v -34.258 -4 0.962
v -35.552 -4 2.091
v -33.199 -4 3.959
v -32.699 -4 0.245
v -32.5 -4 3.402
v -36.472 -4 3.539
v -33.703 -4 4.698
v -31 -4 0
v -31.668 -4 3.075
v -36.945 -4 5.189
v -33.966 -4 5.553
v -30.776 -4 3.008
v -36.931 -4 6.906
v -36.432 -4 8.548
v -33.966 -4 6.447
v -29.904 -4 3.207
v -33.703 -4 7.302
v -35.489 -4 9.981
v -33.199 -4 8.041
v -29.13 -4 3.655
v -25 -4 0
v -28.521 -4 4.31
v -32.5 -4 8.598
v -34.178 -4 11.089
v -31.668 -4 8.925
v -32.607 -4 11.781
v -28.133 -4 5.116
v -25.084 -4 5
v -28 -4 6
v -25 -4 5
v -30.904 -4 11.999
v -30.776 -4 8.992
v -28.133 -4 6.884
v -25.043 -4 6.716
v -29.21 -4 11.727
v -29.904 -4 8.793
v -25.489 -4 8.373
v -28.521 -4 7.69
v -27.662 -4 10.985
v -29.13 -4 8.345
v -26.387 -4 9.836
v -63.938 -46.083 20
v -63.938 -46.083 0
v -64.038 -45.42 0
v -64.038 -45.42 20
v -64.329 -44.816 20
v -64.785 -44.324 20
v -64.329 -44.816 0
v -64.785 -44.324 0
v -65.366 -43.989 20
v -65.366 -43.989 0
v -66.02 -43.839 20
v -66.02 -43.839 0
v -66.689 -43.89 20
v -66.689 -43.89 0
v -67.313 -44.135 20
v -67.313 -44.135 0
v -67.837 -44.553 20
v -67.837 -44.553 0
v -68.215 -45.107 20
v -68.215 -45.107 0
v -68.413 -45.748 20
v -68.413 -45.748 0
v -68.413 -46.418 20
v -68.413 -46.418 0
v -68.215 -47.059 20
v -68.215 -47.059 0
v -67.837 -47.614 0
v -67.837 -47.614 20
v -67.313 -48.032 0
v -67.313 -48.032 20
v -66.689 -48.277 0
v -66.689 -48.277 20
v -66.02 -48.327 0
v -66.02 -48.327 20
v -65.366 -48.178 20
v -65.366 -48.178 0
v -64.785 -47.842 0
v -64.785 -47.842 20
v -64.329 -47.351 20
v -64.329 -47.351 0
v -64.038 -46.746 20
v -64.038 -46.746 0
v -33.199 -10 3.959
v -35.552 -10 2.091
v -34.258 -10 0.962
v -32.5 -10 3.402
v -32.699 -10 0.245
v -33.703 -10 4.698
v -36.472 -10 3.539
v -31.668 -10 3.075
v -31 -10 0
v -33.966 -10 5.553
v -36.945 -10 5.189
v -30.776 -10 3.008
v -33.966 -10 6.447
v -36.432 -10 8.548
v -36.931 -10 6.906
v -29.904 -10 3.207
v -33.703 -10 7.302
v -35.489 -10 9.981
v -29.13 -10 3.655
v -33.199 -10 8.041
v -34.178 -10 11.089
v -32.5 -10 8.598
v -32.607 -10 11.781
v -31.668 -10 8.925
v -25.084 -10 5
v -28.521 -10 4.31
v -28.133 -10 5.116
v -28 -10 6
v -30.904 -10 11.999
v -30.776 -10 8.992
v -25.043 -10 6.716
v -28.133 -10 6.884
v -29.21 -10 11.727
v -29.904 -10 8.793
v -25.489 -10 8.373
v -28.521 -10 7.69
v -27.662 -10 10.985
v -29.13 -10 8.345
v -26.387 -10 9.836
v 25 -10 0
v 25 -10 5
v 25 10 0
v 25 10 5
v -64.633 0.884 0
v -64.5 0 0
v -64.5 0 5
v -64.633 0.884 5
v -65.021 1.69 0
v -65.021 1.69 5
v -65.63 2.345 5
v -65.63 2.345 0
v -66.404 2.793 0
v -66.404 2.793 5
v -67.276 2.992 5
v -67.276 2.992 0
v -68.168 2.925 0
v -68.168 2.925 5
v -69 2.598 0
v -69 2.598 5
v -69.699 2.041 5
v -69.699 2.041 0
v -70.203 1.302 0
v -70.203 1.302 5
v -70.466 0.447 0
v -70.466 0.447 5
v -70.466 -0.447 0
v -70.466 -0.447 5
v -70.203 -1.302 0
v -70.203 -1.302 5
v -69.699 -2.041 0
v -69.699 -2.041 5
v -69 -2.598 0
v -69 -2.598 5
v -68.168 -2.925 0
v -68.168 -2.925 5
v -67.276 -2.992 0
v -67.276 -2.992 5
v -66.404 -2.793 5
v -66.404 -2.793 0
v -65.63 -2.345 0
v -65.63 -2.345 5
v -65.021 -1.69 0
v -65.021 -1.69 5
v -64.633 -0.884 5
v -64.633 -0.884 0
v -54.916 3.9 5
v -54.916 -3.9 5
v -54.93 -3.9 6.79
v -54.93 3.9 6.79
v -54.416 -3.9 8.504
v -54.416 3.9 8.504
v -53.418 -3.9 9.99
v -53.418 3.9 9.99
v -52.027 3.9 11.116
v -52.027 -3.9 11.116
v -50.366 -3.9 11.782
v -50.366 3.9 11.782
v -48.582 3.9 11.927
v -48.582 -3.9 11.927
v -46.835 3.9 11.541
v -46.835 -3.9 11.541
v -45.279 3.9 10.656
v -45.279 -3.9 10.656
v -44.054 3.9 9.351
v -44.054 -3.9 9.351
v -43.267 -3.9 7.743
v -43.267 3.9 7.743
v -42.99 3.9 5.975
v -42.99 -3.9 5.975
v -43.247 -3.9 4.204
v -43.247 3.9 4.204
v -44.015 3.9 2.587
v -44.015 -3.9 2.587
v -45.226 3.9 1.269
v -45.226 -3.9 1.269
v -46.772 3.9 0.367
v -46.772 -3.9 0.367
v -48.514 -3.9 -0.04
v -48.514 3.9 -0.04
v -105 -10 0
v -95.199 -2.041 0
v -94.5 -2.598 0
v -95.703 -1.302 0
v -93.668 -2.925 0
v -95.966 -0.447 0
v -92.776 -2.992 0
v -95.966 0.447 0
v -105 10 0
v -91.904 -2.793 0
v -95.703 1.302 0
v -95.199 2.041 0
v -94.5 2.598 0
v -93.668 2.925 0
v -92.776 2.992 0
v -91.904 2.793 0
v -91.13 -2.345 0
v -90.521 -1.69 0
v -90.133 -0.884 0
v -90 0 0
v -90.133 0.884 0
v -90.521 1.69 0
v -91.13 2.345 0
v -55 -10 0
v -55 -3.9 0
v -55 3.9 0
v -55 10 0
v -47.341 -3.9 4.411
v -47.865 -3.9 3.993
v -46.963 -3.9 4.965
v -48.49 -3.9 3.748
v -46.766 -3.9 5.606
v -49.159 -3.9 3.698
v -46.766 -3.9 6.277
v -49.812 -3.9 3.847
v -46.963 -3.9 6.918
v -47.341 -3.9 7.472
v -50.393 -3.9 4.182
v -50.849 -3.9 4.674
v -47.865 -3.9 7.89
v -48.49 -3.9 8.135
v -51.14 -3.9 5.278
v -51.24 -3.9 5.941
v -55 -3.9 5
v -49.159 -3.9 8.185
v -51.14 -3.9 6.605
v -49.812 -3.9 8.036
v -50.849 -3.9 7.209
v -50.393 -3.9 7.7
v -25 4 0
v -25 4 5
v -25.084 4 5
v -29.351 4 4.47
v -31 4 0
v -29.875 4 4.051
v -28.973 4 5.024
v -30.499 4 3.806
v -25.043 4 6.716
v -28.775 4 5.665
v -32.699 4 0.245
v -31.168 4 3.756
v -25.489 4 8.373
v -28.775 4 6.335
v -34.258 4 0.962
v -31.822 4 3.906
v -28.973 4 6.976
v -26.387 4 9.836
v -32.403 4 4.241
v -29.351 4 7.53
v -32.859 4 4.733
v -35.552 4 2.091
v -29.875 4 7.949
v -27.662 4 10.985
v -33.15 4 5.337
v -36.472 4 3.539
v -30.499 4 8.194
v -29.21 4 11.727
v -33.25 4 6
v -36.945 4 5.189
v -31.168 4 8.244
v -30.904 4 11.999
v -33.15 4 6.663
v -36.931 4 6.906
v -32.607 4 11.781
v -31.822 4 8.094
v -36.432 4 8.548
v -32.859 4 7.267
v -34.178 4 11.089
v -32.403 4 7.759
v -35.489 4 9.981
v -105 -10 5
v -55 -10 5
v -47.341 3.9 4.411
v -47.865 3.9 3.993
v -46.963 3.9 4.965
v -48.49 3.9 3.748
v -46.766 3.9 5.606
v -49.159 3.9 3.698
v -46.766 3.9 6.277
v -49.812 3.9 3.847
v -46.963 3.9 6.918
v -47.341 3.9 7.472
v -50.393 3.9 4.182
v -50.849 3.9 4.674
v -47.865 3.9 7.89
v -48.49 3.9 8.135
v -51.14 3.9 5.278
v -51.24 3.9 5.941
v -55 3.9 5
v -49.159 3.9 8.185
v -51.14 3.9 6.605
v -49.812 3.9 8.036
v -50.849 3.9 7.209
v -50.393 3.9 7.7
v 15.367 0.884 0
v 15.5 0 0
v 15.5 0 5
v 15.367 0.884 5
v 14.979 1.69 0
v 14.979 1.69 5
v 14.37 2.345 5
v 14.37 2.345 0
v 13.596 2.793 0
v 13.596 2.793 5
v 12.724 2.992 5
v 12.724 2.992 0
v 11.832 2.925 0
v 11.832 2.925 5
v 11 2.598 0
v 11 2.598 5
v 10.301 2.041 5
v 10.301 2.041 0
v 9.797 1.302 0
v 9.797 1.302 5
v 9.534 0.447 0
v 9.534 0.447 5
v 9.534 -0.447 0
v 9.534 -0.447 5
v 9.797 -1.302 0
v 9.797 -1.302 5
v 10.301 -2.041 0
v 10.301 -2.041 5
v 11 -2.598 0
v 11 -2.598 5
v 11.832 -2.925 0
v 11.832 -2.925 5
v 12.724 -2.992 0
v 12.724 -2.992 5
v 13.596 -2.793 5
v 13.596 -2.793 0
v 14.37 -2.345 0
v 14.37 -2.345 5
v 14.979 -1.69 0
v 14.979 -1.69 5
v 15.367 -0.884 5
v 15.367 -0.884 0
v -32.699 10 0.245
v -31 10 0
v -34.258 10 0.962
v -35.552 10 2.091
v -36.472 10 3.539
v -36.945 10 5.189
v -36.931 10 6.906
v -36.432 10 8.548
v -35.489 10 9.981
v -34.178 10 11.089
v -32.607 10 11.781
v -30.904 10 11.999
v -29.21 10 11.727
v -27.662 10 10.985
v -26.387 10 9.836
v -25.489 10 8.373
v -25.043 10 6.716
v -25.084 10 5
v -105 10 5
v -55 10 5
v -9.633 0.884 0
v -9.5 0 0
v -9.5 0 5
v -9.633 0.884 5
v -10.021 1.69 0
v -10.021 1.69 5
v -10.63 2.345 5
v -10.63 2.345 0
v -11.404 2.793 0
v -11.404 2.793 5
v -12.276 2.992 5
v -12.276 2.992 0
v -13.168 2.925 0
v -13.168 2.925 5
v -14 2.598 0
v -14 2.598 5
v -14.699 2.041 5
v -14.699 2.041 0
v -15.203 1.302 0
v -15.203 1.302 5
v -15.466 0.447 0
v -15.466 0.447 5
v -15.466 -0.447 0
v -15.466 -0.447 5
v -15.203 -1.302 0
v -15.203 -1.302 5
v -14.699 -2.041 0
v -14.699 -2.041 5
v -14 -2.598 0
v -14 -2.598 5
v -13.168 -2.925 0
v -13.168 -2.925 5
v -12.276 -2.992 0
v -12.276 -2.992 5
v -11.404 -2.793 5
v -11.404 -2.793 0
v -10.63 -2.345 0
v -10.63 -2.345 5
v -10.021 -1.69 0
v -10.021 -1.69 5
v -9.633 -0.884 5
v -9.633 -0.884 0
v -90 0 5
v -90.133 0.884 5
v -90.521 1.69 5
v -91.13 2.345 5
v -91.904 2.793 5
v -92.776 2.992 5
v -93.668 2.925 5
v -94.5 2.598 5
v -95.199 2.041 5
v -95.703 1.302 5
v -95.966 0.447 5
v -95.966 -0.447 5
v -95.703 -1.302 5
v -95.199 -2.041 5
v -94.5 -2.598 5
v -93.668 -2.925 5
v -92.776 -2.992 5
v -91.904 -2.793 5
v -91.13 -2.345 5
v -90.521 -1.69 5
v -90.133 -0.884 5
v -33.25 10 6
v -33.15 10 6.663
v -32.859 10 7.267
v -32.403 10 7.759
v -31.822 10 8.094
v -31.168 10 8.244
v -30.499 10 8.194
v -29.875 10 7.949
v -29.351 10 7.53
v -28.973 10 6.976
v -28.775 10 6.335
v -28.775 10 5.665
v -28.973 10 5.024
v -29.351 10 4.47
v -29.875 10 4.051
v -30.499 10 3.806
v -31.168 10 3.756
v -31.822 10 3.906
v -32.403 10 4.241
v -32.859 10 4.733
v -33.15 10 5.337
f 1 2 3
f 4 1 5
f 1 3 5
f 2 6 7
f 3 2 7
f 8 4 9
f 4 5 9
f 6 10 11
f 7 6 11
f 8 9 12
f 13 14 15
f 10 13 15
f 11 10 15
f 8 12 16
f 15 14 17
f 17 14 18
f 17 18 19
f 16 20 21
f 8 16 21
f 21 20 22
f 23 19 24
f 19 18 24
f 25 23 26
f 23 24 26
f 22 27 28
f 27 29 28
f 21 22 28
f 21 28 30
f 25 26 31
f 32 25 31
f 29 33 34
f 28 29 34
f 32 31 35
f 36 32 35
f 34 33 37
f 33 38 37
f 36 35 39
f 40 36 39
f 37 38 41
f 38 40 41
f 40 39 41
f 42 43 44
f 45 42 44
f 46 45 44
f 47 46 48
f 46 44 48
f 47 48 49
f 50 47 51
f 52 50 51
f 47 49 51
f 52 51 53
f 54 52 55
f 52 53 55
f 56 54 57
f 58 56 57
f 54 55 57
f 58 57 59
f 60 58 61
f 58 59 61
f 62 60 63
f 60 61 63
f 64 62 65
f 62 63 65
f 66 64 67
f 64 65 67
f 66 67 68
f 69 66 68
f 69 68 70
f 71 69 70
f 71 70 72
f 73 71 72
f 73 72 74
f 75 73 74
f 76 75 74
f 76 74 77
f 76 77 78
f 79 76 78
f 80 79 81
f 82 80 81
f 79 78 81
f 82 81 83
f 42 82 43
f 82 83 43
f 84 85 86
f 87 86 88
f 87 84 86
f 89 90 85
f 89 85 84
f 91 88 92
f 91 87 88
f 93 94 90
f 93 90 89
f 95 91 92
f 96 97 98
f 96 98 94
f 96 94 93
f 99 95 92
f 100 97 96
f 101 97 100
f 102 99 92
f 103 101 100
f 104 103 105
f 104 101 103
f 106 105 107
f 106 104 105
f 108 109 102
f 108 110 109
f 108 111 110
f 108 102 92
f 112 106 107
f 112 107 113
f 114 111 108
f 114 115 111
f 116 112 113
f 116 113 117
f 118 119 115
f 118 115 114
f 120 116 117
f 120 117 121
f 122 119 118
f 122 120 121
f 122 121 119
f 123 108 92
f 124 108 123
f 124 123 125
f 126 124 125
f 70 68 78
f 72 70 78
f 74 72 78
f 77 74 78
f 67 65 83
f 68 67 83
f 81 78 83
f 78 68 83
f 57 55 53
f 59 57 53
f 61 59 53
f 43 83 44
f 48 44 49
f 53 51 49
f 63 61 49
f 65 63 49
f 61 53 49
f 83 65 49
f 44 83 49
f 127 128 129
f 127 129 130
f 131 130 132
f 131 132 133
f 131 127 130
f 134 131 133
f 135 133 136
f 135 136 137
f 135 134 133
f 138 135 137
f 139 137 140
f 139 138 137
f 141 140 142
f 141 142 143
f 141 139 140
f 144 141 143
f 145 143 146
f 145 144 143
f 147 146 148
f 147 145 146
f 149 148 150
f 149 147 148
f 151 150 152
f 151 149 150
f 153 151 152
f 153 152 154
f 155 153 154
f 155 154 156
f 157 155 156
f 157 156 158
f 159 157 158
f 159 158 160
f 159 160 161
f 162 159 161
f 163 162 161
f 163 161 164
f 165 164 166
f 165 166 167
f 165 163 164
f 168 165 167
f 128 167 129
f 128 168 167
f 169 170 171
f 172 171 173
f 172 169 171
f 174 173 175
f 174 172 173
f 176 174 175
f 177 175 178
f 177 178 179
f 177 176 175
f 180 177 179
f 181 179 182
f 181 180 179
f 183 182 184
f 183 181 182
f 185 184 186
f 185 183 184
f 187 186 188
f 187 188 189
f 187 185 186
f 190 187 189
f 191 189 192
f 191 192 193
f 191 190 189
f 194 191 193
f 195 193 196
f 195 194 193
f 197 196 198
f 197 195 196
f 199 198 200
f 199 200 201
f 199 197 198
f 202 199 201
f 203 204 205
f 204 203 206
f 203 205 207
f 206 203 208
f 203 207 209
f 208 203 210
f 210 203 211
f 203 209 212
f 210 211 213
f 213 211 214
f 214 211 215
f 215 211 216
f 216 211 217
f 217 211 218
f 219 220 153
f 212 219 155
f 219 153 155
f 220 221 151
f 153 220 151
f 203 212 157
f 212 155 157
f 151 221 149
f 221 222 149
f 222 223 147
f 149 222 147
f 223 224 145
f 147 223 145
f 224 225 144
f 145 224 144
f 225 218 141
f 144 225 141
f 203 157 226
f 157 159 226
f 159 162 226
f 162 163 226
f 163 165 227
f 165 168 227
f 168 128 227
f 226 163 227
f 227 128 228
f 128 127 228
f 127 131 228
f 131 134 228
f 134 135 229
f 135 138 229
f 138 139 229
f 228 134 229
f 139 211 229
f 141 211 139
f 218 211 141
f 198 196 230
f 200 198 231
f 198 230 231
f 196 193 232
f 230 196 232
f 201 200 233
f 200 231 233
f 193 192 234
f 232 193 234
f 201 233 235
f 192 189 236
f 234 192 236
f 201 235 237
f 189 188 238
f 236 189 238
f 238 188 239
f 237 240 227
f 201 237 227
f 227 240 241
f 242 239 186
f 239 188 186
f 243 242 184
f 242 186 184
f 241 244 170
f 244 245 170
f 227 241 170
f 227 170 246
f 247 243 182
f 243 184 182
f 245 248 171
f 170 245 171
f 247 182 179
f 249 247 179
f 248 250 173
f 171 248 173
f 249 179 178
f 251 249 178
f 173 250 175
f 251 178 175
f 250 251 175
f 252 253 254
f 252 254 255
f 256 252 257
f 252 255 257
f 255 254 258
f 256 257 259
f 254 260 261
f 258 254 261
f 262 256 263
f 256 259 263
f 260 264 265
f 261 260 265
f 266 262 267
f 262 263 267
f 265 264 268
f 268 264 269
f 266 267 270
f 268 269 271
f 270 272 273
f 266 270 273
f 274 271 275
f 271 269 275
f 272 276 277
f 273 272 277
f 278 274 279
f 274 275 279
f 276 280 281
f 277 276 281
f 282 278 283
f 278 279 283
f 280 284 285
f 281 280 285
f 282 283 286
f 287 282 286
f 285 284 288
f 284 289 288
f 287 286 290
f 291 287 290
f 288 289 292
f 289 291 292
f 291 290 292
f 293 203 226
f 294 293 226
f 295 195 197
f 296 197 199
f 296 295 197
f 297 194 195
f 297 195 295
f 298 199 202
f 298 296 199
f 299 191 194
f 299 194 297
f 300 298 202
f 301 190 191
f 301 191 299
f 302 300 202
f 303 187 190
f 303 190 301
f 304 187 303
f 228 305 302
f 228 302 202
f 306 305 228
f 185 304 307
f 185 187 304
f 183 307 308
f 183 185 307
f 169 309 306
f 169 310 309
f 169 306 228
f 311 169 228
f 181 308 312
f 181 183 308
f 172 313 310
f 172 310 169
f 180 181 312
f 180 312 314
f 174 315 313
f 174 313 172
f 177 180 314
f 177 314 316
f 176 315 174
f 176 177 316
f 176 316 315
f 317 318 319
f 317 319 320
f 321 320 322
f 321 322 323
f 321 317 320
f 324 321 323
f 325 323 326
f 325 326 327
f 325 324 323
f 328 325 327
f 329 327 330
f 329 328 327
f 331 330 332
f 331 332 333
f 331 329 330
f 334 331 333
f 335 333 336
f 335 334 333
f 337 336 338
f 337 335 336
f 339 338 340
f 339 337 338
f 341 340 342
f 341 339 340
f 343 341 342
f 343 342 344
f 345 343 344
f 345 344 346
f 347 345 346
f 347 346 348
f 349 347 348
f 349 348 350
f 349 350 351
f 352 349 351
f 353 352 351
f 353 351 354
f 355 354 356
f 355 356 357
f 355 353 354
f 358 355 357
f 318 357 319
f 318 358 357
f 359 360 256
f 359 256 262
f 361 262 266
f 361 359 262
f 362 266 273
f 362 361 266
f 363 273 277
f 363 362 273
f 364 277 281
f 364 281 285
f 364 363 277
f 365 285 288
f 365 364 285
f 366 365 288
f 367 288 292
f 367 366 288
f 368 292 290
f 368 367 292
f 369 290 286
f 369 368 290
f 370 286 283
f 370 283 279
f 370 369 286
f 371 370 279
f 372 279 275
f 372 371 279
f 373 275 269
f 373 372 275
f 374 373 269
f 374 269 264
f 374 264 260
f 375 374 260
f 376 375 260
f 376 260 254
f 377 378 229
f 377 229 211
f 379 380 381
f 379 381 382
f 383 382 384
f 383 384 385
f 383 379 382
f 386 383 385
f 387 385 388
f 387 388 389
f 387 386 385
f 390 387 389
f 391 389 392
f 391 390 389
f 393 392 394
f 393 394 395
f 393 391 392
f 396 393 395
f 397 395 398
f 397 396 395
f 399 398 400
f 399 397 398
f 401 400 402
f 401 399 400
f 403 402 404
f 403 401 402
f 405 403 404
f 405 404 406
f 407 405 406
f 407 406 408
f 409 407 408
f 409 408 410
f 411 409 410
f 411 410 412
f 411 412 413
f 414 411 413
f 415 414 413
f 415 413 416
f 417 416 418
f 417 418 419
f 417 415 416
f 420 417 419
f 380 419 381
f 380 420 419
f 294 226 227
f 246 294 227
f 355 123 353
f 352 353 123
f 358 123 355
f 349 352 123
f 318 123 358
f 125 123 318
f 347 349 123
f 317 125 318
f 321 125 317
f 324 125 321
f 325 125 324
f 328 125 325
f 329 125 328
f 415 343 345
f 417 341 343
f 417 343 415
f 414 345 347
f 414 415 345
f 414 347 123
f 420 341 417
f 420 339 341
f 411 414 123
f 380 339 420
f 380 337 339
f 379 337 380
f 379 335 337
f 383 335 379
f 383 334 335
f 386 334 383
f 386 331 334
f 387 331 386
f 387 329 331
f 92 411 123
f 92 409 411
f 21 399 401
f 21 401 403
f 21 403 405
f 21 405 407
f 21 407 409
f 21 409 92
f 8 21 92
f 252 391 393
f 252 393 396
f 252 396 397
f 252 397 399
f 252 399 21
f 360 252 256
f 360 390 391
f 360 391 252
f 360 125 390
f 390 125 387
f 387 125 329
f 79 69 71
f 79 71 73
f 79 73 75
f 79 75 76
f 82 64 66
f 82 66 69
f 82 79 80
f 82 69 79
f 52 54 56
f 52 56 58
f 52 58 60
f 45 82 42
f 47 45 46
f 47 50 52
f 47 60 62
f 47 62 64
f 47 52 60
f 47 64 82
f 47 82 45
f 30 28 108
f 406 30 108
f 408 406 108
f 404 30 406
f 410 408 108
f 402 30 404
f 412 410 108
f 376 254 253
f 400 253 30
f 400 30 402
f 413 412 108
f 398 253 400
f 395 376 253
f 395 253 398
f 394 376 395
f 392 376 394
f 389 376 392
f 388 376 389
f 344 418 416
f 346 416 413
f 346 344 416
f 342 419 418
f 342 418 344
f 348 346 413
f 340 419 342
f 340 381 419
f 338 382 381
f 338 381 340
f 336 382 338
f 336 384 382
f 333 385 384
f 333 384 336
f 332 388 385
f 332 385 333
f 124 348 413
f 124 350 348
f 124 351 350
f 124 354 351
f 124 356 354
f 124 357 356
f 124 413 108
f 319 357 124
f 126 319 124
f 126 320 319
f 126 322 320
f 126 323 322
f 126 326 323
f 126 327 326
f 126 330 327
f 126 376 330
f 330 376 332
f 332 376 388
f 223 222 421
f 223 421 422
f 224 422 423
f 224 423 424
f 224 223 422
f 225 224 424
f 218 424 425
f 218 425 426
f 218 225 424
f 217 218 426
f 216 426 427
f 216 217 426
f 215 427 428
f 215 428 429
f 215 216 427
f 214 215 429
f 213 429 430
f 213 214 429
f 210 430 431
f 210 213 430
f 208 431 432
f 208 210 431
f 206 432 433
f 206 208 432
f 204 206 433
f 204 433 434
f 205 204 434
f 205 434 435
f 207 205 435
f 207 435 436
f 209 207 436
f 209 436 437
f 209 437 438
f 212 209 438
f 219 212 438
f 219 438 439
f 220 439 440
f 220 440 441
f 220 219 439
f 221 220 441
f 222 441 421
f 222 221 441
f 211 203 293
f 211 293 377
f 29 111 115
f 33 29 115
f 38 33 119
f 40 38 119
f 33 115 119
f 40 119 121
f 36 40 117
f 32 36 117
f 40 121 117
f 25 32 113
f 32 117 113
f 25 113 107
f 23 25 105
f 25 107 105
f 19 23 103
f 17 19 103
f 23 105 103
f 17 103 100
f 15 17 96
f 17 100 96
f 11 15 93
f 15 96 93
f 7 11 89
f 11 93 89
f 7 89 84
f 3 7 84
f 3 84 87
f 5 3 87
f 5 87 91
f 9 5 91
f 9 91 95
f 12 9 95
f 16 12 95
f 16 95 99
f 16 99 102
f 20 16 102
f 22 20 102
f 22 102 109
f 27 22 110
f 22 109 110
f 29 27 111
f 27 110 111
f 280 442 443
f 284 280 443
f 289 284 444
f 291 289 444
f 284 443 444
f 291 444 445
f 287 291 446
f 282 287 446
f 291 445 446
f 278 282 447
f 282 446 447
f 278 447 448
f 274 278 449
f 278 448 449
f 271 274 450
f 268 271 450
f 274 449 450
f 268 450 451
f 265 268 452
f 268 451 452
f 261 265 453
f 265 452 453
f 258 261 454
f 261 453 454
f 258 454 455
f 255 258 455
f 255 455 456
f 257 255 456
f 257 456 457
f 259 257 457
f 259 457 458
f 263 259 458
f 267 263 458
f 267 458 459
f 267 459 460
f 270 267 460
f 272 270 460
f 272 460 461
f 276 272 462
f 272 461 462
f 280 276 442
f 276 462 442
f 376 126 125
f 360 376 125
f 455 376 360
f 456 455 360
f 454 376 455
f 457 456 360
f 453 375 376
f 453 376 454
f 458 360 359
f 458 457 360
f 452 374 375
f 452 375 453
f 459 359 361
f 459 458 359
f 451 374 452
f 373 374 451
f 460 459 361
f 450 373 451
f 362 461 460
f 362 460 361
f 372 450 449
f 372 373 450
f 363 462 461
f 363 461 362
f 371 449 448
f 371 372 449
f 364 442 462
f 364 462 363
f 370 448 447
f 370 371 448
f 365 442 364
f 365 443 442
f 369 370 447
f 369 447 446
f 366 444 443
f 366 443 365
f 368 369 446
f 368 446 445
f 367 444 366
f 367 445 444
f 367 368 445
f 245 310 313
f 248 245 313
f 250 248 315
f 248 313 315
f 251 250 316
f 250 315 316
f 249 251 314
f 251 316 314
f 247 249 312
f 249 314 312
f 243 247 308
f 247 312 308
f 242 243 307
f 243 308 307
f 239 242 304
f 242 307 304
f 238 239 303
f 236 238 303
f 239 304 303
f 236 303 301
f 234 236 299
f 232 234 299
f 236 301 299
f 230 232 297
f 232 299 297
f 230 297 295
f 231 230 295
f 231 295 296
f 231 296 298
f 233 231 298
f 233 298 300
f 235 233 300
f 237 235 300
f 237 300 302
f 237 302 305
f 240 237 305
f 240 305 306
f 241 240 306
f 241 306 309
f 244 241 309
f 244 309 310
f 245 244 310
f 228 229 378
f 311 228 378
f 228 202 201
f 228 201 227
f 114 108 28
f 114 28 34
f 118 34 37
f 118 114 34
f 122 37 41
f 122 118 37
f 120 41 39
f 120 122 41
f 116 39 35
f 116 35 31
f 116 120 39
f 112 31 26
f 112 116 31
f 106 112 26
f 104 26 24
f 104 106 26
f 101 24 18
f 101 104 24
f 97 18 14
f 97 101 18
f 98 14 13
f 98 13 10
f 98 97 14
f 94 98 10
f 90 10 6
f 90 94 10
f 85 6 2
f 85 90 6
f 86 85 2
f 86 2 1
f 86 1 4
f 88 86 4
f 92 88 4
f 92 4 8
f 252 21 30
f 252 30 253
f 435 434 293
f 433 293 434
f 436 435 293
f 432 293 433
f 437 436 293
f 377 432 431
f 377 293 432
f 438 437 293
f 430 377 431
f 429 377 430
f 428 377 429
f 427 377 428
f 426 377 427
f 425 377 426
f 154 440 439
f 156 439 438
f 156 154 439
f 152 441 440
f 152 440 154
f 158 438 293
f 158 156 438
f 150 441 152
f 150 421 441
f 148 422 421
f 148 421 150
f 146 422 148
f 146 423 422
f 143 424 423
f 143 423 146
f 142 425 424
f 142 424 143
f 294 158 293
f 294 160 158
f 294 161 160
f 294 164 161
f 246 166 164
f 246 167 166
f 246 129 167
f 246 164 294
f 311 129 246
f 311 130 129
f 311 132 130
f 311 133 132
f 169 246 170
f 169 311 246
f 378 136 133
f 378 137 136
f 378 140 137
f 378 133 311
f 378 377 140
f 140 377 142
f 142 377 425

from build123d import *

# Parameters (mm, degrees)
F0_W      = 50
F0_H      = 20
F0_R      = 3
F1_DEPTH  = 5
F2_R      = 3
F3_DEPTH  = 6
F4_R      = 3
F5_DEPTH  = 6
F6_R      = 2.25
F7_DEPTH  = 13.9
F8_DEPTH  = 6.1
F9_R      = 2.25
F10_DEPTH = 20
F4_R_2    = 2.25
F11_DEPTH = 6


with BuildPart() as f1:
    # F0 (on Top) → F1 (new body)
    with BuildSketch(Plane.XY):
        Rectangle(F0_W, F0_H)
        with Locations((-12.5, 0)):
            Circle(F0_R, mode=Mode.SUBTRACT)
        with Locations((12.5, 0)):
            Circle(F0_R, mode=Mode.SUBTRACT)
        with Locations((-80, 0)):
            Rectangle(F0_W, F0_H)
        with Locations((-93, 0)):
            Circle(F0_R, mode=Mode.SUBTRACT)
        with Locations((-67.5, 0)):
            Circle(F0_R, mode=Mode.SUBTRACT)
    extrude(amount=F1_DEPTH)

    # F2 (on face) → F3 (join)
    with BuildSketch(Plane.XZ.offset(10)):
        with BuildLine():
            Line((-25, 5), (-25.08392, 5))
            ThreePointArc((-25.08392, 5), (-34.872983, 10.582576), (-31, 0))
            Line((-31, 0), (-25, 0))
            Line((-25, 0), (-25, 5))
        make_face()
        with Locations((-31, 6)):
            Circle(F2_R, mode=Mode.SUBTRACT)
    extrude(amount=-F3_DEPTH)

    # F4 (on face) → F5 (join)
    with BuildSketch(Plane(origin=(0, 10, 0), x_dir=(-1, 0, 0), z_dir=(0, 1, 0))):
        with BuildLine():
            Line((25.08392, 5), (25, 5))
            Line((25, 5), (25, 0))
            Line((25, 0), (31, 0))
            ThreePointArc((31, 0), (34.872983, 10.582576), (25.08392, 5))
        make_face()
        with Locations((31, 6)):
            Circle(F4_R, mode=Mode.SUBTRACT)
    extrude(amount=-F5_DEPTH)

    # F6 (on face) → F7 (join)
    with BuildSketch(Plane(origin=(0, 10, 0), x_dir=(-1, 0, 0), z_dir=(0, 1, 0))):
        with BuildLine():
            Line((55, 0), (55, 5))
            Line((55, 5), (54.91608, 5))
            ThreePointArc((54.91608, 5), (45.278929, 10.655691), (48.514497, -0.039757))
            Line((48.514497, -0.039757), (55, 0))
        make_face()
        with Locations((48.990384, 5.94134)):
            Circle(F6_R, mode=Mode.SUBTRACT)
    extrude(amount=-F7_DEPTH)

    # F6 (on face) → F8 (cut)
    with BuildSketch(Plane(origin=(0, 10, 0), x_dir=(-1, 0, 0), z_dir=(0, 1, 0))):
        with BuildLine():
            Line((55, 0), (55, 5))
            Line((55, 5), (54.91608, 5))
            ThreePointArc((54.91608, 5), (45.278929, 10.655691), (48.514497, -0.039757))
            Line((48.514497, -0.039757), (55, 0))
        make_face()
        with Locations((48.990384, 5.94134)):
            Circle(F6_R, mode=Mode.SUBTRACT)
    extrude(amount=-F8_DEPTH, mode=Mode.SUBTRACT)

    # F4 (on face) → F11 (join)
    with BuildSketch(Plane(origin=(0, 10, 0), x_dir=(-1, 0, 0), z_dir=(0, 1, 0))):
        with Locations((31, 6)):
            Circle(F4_R)
        with Locations((31, 6)):
            Circle(F4_R_2, mode=Mode.SUBTRACT)
    extrude(amount=-F11_DEPTH)


with BuildPart() as f10:
    # F9 (on Top) → F10 (new body)
    with BuildSketch(Plane.XY):
        with Locations((-66.18803, -46.083119)):
            Circle(F9_R)
    extrude(amount=F10_DEPTH)


solid = Compound([f1.part, f10.part])
